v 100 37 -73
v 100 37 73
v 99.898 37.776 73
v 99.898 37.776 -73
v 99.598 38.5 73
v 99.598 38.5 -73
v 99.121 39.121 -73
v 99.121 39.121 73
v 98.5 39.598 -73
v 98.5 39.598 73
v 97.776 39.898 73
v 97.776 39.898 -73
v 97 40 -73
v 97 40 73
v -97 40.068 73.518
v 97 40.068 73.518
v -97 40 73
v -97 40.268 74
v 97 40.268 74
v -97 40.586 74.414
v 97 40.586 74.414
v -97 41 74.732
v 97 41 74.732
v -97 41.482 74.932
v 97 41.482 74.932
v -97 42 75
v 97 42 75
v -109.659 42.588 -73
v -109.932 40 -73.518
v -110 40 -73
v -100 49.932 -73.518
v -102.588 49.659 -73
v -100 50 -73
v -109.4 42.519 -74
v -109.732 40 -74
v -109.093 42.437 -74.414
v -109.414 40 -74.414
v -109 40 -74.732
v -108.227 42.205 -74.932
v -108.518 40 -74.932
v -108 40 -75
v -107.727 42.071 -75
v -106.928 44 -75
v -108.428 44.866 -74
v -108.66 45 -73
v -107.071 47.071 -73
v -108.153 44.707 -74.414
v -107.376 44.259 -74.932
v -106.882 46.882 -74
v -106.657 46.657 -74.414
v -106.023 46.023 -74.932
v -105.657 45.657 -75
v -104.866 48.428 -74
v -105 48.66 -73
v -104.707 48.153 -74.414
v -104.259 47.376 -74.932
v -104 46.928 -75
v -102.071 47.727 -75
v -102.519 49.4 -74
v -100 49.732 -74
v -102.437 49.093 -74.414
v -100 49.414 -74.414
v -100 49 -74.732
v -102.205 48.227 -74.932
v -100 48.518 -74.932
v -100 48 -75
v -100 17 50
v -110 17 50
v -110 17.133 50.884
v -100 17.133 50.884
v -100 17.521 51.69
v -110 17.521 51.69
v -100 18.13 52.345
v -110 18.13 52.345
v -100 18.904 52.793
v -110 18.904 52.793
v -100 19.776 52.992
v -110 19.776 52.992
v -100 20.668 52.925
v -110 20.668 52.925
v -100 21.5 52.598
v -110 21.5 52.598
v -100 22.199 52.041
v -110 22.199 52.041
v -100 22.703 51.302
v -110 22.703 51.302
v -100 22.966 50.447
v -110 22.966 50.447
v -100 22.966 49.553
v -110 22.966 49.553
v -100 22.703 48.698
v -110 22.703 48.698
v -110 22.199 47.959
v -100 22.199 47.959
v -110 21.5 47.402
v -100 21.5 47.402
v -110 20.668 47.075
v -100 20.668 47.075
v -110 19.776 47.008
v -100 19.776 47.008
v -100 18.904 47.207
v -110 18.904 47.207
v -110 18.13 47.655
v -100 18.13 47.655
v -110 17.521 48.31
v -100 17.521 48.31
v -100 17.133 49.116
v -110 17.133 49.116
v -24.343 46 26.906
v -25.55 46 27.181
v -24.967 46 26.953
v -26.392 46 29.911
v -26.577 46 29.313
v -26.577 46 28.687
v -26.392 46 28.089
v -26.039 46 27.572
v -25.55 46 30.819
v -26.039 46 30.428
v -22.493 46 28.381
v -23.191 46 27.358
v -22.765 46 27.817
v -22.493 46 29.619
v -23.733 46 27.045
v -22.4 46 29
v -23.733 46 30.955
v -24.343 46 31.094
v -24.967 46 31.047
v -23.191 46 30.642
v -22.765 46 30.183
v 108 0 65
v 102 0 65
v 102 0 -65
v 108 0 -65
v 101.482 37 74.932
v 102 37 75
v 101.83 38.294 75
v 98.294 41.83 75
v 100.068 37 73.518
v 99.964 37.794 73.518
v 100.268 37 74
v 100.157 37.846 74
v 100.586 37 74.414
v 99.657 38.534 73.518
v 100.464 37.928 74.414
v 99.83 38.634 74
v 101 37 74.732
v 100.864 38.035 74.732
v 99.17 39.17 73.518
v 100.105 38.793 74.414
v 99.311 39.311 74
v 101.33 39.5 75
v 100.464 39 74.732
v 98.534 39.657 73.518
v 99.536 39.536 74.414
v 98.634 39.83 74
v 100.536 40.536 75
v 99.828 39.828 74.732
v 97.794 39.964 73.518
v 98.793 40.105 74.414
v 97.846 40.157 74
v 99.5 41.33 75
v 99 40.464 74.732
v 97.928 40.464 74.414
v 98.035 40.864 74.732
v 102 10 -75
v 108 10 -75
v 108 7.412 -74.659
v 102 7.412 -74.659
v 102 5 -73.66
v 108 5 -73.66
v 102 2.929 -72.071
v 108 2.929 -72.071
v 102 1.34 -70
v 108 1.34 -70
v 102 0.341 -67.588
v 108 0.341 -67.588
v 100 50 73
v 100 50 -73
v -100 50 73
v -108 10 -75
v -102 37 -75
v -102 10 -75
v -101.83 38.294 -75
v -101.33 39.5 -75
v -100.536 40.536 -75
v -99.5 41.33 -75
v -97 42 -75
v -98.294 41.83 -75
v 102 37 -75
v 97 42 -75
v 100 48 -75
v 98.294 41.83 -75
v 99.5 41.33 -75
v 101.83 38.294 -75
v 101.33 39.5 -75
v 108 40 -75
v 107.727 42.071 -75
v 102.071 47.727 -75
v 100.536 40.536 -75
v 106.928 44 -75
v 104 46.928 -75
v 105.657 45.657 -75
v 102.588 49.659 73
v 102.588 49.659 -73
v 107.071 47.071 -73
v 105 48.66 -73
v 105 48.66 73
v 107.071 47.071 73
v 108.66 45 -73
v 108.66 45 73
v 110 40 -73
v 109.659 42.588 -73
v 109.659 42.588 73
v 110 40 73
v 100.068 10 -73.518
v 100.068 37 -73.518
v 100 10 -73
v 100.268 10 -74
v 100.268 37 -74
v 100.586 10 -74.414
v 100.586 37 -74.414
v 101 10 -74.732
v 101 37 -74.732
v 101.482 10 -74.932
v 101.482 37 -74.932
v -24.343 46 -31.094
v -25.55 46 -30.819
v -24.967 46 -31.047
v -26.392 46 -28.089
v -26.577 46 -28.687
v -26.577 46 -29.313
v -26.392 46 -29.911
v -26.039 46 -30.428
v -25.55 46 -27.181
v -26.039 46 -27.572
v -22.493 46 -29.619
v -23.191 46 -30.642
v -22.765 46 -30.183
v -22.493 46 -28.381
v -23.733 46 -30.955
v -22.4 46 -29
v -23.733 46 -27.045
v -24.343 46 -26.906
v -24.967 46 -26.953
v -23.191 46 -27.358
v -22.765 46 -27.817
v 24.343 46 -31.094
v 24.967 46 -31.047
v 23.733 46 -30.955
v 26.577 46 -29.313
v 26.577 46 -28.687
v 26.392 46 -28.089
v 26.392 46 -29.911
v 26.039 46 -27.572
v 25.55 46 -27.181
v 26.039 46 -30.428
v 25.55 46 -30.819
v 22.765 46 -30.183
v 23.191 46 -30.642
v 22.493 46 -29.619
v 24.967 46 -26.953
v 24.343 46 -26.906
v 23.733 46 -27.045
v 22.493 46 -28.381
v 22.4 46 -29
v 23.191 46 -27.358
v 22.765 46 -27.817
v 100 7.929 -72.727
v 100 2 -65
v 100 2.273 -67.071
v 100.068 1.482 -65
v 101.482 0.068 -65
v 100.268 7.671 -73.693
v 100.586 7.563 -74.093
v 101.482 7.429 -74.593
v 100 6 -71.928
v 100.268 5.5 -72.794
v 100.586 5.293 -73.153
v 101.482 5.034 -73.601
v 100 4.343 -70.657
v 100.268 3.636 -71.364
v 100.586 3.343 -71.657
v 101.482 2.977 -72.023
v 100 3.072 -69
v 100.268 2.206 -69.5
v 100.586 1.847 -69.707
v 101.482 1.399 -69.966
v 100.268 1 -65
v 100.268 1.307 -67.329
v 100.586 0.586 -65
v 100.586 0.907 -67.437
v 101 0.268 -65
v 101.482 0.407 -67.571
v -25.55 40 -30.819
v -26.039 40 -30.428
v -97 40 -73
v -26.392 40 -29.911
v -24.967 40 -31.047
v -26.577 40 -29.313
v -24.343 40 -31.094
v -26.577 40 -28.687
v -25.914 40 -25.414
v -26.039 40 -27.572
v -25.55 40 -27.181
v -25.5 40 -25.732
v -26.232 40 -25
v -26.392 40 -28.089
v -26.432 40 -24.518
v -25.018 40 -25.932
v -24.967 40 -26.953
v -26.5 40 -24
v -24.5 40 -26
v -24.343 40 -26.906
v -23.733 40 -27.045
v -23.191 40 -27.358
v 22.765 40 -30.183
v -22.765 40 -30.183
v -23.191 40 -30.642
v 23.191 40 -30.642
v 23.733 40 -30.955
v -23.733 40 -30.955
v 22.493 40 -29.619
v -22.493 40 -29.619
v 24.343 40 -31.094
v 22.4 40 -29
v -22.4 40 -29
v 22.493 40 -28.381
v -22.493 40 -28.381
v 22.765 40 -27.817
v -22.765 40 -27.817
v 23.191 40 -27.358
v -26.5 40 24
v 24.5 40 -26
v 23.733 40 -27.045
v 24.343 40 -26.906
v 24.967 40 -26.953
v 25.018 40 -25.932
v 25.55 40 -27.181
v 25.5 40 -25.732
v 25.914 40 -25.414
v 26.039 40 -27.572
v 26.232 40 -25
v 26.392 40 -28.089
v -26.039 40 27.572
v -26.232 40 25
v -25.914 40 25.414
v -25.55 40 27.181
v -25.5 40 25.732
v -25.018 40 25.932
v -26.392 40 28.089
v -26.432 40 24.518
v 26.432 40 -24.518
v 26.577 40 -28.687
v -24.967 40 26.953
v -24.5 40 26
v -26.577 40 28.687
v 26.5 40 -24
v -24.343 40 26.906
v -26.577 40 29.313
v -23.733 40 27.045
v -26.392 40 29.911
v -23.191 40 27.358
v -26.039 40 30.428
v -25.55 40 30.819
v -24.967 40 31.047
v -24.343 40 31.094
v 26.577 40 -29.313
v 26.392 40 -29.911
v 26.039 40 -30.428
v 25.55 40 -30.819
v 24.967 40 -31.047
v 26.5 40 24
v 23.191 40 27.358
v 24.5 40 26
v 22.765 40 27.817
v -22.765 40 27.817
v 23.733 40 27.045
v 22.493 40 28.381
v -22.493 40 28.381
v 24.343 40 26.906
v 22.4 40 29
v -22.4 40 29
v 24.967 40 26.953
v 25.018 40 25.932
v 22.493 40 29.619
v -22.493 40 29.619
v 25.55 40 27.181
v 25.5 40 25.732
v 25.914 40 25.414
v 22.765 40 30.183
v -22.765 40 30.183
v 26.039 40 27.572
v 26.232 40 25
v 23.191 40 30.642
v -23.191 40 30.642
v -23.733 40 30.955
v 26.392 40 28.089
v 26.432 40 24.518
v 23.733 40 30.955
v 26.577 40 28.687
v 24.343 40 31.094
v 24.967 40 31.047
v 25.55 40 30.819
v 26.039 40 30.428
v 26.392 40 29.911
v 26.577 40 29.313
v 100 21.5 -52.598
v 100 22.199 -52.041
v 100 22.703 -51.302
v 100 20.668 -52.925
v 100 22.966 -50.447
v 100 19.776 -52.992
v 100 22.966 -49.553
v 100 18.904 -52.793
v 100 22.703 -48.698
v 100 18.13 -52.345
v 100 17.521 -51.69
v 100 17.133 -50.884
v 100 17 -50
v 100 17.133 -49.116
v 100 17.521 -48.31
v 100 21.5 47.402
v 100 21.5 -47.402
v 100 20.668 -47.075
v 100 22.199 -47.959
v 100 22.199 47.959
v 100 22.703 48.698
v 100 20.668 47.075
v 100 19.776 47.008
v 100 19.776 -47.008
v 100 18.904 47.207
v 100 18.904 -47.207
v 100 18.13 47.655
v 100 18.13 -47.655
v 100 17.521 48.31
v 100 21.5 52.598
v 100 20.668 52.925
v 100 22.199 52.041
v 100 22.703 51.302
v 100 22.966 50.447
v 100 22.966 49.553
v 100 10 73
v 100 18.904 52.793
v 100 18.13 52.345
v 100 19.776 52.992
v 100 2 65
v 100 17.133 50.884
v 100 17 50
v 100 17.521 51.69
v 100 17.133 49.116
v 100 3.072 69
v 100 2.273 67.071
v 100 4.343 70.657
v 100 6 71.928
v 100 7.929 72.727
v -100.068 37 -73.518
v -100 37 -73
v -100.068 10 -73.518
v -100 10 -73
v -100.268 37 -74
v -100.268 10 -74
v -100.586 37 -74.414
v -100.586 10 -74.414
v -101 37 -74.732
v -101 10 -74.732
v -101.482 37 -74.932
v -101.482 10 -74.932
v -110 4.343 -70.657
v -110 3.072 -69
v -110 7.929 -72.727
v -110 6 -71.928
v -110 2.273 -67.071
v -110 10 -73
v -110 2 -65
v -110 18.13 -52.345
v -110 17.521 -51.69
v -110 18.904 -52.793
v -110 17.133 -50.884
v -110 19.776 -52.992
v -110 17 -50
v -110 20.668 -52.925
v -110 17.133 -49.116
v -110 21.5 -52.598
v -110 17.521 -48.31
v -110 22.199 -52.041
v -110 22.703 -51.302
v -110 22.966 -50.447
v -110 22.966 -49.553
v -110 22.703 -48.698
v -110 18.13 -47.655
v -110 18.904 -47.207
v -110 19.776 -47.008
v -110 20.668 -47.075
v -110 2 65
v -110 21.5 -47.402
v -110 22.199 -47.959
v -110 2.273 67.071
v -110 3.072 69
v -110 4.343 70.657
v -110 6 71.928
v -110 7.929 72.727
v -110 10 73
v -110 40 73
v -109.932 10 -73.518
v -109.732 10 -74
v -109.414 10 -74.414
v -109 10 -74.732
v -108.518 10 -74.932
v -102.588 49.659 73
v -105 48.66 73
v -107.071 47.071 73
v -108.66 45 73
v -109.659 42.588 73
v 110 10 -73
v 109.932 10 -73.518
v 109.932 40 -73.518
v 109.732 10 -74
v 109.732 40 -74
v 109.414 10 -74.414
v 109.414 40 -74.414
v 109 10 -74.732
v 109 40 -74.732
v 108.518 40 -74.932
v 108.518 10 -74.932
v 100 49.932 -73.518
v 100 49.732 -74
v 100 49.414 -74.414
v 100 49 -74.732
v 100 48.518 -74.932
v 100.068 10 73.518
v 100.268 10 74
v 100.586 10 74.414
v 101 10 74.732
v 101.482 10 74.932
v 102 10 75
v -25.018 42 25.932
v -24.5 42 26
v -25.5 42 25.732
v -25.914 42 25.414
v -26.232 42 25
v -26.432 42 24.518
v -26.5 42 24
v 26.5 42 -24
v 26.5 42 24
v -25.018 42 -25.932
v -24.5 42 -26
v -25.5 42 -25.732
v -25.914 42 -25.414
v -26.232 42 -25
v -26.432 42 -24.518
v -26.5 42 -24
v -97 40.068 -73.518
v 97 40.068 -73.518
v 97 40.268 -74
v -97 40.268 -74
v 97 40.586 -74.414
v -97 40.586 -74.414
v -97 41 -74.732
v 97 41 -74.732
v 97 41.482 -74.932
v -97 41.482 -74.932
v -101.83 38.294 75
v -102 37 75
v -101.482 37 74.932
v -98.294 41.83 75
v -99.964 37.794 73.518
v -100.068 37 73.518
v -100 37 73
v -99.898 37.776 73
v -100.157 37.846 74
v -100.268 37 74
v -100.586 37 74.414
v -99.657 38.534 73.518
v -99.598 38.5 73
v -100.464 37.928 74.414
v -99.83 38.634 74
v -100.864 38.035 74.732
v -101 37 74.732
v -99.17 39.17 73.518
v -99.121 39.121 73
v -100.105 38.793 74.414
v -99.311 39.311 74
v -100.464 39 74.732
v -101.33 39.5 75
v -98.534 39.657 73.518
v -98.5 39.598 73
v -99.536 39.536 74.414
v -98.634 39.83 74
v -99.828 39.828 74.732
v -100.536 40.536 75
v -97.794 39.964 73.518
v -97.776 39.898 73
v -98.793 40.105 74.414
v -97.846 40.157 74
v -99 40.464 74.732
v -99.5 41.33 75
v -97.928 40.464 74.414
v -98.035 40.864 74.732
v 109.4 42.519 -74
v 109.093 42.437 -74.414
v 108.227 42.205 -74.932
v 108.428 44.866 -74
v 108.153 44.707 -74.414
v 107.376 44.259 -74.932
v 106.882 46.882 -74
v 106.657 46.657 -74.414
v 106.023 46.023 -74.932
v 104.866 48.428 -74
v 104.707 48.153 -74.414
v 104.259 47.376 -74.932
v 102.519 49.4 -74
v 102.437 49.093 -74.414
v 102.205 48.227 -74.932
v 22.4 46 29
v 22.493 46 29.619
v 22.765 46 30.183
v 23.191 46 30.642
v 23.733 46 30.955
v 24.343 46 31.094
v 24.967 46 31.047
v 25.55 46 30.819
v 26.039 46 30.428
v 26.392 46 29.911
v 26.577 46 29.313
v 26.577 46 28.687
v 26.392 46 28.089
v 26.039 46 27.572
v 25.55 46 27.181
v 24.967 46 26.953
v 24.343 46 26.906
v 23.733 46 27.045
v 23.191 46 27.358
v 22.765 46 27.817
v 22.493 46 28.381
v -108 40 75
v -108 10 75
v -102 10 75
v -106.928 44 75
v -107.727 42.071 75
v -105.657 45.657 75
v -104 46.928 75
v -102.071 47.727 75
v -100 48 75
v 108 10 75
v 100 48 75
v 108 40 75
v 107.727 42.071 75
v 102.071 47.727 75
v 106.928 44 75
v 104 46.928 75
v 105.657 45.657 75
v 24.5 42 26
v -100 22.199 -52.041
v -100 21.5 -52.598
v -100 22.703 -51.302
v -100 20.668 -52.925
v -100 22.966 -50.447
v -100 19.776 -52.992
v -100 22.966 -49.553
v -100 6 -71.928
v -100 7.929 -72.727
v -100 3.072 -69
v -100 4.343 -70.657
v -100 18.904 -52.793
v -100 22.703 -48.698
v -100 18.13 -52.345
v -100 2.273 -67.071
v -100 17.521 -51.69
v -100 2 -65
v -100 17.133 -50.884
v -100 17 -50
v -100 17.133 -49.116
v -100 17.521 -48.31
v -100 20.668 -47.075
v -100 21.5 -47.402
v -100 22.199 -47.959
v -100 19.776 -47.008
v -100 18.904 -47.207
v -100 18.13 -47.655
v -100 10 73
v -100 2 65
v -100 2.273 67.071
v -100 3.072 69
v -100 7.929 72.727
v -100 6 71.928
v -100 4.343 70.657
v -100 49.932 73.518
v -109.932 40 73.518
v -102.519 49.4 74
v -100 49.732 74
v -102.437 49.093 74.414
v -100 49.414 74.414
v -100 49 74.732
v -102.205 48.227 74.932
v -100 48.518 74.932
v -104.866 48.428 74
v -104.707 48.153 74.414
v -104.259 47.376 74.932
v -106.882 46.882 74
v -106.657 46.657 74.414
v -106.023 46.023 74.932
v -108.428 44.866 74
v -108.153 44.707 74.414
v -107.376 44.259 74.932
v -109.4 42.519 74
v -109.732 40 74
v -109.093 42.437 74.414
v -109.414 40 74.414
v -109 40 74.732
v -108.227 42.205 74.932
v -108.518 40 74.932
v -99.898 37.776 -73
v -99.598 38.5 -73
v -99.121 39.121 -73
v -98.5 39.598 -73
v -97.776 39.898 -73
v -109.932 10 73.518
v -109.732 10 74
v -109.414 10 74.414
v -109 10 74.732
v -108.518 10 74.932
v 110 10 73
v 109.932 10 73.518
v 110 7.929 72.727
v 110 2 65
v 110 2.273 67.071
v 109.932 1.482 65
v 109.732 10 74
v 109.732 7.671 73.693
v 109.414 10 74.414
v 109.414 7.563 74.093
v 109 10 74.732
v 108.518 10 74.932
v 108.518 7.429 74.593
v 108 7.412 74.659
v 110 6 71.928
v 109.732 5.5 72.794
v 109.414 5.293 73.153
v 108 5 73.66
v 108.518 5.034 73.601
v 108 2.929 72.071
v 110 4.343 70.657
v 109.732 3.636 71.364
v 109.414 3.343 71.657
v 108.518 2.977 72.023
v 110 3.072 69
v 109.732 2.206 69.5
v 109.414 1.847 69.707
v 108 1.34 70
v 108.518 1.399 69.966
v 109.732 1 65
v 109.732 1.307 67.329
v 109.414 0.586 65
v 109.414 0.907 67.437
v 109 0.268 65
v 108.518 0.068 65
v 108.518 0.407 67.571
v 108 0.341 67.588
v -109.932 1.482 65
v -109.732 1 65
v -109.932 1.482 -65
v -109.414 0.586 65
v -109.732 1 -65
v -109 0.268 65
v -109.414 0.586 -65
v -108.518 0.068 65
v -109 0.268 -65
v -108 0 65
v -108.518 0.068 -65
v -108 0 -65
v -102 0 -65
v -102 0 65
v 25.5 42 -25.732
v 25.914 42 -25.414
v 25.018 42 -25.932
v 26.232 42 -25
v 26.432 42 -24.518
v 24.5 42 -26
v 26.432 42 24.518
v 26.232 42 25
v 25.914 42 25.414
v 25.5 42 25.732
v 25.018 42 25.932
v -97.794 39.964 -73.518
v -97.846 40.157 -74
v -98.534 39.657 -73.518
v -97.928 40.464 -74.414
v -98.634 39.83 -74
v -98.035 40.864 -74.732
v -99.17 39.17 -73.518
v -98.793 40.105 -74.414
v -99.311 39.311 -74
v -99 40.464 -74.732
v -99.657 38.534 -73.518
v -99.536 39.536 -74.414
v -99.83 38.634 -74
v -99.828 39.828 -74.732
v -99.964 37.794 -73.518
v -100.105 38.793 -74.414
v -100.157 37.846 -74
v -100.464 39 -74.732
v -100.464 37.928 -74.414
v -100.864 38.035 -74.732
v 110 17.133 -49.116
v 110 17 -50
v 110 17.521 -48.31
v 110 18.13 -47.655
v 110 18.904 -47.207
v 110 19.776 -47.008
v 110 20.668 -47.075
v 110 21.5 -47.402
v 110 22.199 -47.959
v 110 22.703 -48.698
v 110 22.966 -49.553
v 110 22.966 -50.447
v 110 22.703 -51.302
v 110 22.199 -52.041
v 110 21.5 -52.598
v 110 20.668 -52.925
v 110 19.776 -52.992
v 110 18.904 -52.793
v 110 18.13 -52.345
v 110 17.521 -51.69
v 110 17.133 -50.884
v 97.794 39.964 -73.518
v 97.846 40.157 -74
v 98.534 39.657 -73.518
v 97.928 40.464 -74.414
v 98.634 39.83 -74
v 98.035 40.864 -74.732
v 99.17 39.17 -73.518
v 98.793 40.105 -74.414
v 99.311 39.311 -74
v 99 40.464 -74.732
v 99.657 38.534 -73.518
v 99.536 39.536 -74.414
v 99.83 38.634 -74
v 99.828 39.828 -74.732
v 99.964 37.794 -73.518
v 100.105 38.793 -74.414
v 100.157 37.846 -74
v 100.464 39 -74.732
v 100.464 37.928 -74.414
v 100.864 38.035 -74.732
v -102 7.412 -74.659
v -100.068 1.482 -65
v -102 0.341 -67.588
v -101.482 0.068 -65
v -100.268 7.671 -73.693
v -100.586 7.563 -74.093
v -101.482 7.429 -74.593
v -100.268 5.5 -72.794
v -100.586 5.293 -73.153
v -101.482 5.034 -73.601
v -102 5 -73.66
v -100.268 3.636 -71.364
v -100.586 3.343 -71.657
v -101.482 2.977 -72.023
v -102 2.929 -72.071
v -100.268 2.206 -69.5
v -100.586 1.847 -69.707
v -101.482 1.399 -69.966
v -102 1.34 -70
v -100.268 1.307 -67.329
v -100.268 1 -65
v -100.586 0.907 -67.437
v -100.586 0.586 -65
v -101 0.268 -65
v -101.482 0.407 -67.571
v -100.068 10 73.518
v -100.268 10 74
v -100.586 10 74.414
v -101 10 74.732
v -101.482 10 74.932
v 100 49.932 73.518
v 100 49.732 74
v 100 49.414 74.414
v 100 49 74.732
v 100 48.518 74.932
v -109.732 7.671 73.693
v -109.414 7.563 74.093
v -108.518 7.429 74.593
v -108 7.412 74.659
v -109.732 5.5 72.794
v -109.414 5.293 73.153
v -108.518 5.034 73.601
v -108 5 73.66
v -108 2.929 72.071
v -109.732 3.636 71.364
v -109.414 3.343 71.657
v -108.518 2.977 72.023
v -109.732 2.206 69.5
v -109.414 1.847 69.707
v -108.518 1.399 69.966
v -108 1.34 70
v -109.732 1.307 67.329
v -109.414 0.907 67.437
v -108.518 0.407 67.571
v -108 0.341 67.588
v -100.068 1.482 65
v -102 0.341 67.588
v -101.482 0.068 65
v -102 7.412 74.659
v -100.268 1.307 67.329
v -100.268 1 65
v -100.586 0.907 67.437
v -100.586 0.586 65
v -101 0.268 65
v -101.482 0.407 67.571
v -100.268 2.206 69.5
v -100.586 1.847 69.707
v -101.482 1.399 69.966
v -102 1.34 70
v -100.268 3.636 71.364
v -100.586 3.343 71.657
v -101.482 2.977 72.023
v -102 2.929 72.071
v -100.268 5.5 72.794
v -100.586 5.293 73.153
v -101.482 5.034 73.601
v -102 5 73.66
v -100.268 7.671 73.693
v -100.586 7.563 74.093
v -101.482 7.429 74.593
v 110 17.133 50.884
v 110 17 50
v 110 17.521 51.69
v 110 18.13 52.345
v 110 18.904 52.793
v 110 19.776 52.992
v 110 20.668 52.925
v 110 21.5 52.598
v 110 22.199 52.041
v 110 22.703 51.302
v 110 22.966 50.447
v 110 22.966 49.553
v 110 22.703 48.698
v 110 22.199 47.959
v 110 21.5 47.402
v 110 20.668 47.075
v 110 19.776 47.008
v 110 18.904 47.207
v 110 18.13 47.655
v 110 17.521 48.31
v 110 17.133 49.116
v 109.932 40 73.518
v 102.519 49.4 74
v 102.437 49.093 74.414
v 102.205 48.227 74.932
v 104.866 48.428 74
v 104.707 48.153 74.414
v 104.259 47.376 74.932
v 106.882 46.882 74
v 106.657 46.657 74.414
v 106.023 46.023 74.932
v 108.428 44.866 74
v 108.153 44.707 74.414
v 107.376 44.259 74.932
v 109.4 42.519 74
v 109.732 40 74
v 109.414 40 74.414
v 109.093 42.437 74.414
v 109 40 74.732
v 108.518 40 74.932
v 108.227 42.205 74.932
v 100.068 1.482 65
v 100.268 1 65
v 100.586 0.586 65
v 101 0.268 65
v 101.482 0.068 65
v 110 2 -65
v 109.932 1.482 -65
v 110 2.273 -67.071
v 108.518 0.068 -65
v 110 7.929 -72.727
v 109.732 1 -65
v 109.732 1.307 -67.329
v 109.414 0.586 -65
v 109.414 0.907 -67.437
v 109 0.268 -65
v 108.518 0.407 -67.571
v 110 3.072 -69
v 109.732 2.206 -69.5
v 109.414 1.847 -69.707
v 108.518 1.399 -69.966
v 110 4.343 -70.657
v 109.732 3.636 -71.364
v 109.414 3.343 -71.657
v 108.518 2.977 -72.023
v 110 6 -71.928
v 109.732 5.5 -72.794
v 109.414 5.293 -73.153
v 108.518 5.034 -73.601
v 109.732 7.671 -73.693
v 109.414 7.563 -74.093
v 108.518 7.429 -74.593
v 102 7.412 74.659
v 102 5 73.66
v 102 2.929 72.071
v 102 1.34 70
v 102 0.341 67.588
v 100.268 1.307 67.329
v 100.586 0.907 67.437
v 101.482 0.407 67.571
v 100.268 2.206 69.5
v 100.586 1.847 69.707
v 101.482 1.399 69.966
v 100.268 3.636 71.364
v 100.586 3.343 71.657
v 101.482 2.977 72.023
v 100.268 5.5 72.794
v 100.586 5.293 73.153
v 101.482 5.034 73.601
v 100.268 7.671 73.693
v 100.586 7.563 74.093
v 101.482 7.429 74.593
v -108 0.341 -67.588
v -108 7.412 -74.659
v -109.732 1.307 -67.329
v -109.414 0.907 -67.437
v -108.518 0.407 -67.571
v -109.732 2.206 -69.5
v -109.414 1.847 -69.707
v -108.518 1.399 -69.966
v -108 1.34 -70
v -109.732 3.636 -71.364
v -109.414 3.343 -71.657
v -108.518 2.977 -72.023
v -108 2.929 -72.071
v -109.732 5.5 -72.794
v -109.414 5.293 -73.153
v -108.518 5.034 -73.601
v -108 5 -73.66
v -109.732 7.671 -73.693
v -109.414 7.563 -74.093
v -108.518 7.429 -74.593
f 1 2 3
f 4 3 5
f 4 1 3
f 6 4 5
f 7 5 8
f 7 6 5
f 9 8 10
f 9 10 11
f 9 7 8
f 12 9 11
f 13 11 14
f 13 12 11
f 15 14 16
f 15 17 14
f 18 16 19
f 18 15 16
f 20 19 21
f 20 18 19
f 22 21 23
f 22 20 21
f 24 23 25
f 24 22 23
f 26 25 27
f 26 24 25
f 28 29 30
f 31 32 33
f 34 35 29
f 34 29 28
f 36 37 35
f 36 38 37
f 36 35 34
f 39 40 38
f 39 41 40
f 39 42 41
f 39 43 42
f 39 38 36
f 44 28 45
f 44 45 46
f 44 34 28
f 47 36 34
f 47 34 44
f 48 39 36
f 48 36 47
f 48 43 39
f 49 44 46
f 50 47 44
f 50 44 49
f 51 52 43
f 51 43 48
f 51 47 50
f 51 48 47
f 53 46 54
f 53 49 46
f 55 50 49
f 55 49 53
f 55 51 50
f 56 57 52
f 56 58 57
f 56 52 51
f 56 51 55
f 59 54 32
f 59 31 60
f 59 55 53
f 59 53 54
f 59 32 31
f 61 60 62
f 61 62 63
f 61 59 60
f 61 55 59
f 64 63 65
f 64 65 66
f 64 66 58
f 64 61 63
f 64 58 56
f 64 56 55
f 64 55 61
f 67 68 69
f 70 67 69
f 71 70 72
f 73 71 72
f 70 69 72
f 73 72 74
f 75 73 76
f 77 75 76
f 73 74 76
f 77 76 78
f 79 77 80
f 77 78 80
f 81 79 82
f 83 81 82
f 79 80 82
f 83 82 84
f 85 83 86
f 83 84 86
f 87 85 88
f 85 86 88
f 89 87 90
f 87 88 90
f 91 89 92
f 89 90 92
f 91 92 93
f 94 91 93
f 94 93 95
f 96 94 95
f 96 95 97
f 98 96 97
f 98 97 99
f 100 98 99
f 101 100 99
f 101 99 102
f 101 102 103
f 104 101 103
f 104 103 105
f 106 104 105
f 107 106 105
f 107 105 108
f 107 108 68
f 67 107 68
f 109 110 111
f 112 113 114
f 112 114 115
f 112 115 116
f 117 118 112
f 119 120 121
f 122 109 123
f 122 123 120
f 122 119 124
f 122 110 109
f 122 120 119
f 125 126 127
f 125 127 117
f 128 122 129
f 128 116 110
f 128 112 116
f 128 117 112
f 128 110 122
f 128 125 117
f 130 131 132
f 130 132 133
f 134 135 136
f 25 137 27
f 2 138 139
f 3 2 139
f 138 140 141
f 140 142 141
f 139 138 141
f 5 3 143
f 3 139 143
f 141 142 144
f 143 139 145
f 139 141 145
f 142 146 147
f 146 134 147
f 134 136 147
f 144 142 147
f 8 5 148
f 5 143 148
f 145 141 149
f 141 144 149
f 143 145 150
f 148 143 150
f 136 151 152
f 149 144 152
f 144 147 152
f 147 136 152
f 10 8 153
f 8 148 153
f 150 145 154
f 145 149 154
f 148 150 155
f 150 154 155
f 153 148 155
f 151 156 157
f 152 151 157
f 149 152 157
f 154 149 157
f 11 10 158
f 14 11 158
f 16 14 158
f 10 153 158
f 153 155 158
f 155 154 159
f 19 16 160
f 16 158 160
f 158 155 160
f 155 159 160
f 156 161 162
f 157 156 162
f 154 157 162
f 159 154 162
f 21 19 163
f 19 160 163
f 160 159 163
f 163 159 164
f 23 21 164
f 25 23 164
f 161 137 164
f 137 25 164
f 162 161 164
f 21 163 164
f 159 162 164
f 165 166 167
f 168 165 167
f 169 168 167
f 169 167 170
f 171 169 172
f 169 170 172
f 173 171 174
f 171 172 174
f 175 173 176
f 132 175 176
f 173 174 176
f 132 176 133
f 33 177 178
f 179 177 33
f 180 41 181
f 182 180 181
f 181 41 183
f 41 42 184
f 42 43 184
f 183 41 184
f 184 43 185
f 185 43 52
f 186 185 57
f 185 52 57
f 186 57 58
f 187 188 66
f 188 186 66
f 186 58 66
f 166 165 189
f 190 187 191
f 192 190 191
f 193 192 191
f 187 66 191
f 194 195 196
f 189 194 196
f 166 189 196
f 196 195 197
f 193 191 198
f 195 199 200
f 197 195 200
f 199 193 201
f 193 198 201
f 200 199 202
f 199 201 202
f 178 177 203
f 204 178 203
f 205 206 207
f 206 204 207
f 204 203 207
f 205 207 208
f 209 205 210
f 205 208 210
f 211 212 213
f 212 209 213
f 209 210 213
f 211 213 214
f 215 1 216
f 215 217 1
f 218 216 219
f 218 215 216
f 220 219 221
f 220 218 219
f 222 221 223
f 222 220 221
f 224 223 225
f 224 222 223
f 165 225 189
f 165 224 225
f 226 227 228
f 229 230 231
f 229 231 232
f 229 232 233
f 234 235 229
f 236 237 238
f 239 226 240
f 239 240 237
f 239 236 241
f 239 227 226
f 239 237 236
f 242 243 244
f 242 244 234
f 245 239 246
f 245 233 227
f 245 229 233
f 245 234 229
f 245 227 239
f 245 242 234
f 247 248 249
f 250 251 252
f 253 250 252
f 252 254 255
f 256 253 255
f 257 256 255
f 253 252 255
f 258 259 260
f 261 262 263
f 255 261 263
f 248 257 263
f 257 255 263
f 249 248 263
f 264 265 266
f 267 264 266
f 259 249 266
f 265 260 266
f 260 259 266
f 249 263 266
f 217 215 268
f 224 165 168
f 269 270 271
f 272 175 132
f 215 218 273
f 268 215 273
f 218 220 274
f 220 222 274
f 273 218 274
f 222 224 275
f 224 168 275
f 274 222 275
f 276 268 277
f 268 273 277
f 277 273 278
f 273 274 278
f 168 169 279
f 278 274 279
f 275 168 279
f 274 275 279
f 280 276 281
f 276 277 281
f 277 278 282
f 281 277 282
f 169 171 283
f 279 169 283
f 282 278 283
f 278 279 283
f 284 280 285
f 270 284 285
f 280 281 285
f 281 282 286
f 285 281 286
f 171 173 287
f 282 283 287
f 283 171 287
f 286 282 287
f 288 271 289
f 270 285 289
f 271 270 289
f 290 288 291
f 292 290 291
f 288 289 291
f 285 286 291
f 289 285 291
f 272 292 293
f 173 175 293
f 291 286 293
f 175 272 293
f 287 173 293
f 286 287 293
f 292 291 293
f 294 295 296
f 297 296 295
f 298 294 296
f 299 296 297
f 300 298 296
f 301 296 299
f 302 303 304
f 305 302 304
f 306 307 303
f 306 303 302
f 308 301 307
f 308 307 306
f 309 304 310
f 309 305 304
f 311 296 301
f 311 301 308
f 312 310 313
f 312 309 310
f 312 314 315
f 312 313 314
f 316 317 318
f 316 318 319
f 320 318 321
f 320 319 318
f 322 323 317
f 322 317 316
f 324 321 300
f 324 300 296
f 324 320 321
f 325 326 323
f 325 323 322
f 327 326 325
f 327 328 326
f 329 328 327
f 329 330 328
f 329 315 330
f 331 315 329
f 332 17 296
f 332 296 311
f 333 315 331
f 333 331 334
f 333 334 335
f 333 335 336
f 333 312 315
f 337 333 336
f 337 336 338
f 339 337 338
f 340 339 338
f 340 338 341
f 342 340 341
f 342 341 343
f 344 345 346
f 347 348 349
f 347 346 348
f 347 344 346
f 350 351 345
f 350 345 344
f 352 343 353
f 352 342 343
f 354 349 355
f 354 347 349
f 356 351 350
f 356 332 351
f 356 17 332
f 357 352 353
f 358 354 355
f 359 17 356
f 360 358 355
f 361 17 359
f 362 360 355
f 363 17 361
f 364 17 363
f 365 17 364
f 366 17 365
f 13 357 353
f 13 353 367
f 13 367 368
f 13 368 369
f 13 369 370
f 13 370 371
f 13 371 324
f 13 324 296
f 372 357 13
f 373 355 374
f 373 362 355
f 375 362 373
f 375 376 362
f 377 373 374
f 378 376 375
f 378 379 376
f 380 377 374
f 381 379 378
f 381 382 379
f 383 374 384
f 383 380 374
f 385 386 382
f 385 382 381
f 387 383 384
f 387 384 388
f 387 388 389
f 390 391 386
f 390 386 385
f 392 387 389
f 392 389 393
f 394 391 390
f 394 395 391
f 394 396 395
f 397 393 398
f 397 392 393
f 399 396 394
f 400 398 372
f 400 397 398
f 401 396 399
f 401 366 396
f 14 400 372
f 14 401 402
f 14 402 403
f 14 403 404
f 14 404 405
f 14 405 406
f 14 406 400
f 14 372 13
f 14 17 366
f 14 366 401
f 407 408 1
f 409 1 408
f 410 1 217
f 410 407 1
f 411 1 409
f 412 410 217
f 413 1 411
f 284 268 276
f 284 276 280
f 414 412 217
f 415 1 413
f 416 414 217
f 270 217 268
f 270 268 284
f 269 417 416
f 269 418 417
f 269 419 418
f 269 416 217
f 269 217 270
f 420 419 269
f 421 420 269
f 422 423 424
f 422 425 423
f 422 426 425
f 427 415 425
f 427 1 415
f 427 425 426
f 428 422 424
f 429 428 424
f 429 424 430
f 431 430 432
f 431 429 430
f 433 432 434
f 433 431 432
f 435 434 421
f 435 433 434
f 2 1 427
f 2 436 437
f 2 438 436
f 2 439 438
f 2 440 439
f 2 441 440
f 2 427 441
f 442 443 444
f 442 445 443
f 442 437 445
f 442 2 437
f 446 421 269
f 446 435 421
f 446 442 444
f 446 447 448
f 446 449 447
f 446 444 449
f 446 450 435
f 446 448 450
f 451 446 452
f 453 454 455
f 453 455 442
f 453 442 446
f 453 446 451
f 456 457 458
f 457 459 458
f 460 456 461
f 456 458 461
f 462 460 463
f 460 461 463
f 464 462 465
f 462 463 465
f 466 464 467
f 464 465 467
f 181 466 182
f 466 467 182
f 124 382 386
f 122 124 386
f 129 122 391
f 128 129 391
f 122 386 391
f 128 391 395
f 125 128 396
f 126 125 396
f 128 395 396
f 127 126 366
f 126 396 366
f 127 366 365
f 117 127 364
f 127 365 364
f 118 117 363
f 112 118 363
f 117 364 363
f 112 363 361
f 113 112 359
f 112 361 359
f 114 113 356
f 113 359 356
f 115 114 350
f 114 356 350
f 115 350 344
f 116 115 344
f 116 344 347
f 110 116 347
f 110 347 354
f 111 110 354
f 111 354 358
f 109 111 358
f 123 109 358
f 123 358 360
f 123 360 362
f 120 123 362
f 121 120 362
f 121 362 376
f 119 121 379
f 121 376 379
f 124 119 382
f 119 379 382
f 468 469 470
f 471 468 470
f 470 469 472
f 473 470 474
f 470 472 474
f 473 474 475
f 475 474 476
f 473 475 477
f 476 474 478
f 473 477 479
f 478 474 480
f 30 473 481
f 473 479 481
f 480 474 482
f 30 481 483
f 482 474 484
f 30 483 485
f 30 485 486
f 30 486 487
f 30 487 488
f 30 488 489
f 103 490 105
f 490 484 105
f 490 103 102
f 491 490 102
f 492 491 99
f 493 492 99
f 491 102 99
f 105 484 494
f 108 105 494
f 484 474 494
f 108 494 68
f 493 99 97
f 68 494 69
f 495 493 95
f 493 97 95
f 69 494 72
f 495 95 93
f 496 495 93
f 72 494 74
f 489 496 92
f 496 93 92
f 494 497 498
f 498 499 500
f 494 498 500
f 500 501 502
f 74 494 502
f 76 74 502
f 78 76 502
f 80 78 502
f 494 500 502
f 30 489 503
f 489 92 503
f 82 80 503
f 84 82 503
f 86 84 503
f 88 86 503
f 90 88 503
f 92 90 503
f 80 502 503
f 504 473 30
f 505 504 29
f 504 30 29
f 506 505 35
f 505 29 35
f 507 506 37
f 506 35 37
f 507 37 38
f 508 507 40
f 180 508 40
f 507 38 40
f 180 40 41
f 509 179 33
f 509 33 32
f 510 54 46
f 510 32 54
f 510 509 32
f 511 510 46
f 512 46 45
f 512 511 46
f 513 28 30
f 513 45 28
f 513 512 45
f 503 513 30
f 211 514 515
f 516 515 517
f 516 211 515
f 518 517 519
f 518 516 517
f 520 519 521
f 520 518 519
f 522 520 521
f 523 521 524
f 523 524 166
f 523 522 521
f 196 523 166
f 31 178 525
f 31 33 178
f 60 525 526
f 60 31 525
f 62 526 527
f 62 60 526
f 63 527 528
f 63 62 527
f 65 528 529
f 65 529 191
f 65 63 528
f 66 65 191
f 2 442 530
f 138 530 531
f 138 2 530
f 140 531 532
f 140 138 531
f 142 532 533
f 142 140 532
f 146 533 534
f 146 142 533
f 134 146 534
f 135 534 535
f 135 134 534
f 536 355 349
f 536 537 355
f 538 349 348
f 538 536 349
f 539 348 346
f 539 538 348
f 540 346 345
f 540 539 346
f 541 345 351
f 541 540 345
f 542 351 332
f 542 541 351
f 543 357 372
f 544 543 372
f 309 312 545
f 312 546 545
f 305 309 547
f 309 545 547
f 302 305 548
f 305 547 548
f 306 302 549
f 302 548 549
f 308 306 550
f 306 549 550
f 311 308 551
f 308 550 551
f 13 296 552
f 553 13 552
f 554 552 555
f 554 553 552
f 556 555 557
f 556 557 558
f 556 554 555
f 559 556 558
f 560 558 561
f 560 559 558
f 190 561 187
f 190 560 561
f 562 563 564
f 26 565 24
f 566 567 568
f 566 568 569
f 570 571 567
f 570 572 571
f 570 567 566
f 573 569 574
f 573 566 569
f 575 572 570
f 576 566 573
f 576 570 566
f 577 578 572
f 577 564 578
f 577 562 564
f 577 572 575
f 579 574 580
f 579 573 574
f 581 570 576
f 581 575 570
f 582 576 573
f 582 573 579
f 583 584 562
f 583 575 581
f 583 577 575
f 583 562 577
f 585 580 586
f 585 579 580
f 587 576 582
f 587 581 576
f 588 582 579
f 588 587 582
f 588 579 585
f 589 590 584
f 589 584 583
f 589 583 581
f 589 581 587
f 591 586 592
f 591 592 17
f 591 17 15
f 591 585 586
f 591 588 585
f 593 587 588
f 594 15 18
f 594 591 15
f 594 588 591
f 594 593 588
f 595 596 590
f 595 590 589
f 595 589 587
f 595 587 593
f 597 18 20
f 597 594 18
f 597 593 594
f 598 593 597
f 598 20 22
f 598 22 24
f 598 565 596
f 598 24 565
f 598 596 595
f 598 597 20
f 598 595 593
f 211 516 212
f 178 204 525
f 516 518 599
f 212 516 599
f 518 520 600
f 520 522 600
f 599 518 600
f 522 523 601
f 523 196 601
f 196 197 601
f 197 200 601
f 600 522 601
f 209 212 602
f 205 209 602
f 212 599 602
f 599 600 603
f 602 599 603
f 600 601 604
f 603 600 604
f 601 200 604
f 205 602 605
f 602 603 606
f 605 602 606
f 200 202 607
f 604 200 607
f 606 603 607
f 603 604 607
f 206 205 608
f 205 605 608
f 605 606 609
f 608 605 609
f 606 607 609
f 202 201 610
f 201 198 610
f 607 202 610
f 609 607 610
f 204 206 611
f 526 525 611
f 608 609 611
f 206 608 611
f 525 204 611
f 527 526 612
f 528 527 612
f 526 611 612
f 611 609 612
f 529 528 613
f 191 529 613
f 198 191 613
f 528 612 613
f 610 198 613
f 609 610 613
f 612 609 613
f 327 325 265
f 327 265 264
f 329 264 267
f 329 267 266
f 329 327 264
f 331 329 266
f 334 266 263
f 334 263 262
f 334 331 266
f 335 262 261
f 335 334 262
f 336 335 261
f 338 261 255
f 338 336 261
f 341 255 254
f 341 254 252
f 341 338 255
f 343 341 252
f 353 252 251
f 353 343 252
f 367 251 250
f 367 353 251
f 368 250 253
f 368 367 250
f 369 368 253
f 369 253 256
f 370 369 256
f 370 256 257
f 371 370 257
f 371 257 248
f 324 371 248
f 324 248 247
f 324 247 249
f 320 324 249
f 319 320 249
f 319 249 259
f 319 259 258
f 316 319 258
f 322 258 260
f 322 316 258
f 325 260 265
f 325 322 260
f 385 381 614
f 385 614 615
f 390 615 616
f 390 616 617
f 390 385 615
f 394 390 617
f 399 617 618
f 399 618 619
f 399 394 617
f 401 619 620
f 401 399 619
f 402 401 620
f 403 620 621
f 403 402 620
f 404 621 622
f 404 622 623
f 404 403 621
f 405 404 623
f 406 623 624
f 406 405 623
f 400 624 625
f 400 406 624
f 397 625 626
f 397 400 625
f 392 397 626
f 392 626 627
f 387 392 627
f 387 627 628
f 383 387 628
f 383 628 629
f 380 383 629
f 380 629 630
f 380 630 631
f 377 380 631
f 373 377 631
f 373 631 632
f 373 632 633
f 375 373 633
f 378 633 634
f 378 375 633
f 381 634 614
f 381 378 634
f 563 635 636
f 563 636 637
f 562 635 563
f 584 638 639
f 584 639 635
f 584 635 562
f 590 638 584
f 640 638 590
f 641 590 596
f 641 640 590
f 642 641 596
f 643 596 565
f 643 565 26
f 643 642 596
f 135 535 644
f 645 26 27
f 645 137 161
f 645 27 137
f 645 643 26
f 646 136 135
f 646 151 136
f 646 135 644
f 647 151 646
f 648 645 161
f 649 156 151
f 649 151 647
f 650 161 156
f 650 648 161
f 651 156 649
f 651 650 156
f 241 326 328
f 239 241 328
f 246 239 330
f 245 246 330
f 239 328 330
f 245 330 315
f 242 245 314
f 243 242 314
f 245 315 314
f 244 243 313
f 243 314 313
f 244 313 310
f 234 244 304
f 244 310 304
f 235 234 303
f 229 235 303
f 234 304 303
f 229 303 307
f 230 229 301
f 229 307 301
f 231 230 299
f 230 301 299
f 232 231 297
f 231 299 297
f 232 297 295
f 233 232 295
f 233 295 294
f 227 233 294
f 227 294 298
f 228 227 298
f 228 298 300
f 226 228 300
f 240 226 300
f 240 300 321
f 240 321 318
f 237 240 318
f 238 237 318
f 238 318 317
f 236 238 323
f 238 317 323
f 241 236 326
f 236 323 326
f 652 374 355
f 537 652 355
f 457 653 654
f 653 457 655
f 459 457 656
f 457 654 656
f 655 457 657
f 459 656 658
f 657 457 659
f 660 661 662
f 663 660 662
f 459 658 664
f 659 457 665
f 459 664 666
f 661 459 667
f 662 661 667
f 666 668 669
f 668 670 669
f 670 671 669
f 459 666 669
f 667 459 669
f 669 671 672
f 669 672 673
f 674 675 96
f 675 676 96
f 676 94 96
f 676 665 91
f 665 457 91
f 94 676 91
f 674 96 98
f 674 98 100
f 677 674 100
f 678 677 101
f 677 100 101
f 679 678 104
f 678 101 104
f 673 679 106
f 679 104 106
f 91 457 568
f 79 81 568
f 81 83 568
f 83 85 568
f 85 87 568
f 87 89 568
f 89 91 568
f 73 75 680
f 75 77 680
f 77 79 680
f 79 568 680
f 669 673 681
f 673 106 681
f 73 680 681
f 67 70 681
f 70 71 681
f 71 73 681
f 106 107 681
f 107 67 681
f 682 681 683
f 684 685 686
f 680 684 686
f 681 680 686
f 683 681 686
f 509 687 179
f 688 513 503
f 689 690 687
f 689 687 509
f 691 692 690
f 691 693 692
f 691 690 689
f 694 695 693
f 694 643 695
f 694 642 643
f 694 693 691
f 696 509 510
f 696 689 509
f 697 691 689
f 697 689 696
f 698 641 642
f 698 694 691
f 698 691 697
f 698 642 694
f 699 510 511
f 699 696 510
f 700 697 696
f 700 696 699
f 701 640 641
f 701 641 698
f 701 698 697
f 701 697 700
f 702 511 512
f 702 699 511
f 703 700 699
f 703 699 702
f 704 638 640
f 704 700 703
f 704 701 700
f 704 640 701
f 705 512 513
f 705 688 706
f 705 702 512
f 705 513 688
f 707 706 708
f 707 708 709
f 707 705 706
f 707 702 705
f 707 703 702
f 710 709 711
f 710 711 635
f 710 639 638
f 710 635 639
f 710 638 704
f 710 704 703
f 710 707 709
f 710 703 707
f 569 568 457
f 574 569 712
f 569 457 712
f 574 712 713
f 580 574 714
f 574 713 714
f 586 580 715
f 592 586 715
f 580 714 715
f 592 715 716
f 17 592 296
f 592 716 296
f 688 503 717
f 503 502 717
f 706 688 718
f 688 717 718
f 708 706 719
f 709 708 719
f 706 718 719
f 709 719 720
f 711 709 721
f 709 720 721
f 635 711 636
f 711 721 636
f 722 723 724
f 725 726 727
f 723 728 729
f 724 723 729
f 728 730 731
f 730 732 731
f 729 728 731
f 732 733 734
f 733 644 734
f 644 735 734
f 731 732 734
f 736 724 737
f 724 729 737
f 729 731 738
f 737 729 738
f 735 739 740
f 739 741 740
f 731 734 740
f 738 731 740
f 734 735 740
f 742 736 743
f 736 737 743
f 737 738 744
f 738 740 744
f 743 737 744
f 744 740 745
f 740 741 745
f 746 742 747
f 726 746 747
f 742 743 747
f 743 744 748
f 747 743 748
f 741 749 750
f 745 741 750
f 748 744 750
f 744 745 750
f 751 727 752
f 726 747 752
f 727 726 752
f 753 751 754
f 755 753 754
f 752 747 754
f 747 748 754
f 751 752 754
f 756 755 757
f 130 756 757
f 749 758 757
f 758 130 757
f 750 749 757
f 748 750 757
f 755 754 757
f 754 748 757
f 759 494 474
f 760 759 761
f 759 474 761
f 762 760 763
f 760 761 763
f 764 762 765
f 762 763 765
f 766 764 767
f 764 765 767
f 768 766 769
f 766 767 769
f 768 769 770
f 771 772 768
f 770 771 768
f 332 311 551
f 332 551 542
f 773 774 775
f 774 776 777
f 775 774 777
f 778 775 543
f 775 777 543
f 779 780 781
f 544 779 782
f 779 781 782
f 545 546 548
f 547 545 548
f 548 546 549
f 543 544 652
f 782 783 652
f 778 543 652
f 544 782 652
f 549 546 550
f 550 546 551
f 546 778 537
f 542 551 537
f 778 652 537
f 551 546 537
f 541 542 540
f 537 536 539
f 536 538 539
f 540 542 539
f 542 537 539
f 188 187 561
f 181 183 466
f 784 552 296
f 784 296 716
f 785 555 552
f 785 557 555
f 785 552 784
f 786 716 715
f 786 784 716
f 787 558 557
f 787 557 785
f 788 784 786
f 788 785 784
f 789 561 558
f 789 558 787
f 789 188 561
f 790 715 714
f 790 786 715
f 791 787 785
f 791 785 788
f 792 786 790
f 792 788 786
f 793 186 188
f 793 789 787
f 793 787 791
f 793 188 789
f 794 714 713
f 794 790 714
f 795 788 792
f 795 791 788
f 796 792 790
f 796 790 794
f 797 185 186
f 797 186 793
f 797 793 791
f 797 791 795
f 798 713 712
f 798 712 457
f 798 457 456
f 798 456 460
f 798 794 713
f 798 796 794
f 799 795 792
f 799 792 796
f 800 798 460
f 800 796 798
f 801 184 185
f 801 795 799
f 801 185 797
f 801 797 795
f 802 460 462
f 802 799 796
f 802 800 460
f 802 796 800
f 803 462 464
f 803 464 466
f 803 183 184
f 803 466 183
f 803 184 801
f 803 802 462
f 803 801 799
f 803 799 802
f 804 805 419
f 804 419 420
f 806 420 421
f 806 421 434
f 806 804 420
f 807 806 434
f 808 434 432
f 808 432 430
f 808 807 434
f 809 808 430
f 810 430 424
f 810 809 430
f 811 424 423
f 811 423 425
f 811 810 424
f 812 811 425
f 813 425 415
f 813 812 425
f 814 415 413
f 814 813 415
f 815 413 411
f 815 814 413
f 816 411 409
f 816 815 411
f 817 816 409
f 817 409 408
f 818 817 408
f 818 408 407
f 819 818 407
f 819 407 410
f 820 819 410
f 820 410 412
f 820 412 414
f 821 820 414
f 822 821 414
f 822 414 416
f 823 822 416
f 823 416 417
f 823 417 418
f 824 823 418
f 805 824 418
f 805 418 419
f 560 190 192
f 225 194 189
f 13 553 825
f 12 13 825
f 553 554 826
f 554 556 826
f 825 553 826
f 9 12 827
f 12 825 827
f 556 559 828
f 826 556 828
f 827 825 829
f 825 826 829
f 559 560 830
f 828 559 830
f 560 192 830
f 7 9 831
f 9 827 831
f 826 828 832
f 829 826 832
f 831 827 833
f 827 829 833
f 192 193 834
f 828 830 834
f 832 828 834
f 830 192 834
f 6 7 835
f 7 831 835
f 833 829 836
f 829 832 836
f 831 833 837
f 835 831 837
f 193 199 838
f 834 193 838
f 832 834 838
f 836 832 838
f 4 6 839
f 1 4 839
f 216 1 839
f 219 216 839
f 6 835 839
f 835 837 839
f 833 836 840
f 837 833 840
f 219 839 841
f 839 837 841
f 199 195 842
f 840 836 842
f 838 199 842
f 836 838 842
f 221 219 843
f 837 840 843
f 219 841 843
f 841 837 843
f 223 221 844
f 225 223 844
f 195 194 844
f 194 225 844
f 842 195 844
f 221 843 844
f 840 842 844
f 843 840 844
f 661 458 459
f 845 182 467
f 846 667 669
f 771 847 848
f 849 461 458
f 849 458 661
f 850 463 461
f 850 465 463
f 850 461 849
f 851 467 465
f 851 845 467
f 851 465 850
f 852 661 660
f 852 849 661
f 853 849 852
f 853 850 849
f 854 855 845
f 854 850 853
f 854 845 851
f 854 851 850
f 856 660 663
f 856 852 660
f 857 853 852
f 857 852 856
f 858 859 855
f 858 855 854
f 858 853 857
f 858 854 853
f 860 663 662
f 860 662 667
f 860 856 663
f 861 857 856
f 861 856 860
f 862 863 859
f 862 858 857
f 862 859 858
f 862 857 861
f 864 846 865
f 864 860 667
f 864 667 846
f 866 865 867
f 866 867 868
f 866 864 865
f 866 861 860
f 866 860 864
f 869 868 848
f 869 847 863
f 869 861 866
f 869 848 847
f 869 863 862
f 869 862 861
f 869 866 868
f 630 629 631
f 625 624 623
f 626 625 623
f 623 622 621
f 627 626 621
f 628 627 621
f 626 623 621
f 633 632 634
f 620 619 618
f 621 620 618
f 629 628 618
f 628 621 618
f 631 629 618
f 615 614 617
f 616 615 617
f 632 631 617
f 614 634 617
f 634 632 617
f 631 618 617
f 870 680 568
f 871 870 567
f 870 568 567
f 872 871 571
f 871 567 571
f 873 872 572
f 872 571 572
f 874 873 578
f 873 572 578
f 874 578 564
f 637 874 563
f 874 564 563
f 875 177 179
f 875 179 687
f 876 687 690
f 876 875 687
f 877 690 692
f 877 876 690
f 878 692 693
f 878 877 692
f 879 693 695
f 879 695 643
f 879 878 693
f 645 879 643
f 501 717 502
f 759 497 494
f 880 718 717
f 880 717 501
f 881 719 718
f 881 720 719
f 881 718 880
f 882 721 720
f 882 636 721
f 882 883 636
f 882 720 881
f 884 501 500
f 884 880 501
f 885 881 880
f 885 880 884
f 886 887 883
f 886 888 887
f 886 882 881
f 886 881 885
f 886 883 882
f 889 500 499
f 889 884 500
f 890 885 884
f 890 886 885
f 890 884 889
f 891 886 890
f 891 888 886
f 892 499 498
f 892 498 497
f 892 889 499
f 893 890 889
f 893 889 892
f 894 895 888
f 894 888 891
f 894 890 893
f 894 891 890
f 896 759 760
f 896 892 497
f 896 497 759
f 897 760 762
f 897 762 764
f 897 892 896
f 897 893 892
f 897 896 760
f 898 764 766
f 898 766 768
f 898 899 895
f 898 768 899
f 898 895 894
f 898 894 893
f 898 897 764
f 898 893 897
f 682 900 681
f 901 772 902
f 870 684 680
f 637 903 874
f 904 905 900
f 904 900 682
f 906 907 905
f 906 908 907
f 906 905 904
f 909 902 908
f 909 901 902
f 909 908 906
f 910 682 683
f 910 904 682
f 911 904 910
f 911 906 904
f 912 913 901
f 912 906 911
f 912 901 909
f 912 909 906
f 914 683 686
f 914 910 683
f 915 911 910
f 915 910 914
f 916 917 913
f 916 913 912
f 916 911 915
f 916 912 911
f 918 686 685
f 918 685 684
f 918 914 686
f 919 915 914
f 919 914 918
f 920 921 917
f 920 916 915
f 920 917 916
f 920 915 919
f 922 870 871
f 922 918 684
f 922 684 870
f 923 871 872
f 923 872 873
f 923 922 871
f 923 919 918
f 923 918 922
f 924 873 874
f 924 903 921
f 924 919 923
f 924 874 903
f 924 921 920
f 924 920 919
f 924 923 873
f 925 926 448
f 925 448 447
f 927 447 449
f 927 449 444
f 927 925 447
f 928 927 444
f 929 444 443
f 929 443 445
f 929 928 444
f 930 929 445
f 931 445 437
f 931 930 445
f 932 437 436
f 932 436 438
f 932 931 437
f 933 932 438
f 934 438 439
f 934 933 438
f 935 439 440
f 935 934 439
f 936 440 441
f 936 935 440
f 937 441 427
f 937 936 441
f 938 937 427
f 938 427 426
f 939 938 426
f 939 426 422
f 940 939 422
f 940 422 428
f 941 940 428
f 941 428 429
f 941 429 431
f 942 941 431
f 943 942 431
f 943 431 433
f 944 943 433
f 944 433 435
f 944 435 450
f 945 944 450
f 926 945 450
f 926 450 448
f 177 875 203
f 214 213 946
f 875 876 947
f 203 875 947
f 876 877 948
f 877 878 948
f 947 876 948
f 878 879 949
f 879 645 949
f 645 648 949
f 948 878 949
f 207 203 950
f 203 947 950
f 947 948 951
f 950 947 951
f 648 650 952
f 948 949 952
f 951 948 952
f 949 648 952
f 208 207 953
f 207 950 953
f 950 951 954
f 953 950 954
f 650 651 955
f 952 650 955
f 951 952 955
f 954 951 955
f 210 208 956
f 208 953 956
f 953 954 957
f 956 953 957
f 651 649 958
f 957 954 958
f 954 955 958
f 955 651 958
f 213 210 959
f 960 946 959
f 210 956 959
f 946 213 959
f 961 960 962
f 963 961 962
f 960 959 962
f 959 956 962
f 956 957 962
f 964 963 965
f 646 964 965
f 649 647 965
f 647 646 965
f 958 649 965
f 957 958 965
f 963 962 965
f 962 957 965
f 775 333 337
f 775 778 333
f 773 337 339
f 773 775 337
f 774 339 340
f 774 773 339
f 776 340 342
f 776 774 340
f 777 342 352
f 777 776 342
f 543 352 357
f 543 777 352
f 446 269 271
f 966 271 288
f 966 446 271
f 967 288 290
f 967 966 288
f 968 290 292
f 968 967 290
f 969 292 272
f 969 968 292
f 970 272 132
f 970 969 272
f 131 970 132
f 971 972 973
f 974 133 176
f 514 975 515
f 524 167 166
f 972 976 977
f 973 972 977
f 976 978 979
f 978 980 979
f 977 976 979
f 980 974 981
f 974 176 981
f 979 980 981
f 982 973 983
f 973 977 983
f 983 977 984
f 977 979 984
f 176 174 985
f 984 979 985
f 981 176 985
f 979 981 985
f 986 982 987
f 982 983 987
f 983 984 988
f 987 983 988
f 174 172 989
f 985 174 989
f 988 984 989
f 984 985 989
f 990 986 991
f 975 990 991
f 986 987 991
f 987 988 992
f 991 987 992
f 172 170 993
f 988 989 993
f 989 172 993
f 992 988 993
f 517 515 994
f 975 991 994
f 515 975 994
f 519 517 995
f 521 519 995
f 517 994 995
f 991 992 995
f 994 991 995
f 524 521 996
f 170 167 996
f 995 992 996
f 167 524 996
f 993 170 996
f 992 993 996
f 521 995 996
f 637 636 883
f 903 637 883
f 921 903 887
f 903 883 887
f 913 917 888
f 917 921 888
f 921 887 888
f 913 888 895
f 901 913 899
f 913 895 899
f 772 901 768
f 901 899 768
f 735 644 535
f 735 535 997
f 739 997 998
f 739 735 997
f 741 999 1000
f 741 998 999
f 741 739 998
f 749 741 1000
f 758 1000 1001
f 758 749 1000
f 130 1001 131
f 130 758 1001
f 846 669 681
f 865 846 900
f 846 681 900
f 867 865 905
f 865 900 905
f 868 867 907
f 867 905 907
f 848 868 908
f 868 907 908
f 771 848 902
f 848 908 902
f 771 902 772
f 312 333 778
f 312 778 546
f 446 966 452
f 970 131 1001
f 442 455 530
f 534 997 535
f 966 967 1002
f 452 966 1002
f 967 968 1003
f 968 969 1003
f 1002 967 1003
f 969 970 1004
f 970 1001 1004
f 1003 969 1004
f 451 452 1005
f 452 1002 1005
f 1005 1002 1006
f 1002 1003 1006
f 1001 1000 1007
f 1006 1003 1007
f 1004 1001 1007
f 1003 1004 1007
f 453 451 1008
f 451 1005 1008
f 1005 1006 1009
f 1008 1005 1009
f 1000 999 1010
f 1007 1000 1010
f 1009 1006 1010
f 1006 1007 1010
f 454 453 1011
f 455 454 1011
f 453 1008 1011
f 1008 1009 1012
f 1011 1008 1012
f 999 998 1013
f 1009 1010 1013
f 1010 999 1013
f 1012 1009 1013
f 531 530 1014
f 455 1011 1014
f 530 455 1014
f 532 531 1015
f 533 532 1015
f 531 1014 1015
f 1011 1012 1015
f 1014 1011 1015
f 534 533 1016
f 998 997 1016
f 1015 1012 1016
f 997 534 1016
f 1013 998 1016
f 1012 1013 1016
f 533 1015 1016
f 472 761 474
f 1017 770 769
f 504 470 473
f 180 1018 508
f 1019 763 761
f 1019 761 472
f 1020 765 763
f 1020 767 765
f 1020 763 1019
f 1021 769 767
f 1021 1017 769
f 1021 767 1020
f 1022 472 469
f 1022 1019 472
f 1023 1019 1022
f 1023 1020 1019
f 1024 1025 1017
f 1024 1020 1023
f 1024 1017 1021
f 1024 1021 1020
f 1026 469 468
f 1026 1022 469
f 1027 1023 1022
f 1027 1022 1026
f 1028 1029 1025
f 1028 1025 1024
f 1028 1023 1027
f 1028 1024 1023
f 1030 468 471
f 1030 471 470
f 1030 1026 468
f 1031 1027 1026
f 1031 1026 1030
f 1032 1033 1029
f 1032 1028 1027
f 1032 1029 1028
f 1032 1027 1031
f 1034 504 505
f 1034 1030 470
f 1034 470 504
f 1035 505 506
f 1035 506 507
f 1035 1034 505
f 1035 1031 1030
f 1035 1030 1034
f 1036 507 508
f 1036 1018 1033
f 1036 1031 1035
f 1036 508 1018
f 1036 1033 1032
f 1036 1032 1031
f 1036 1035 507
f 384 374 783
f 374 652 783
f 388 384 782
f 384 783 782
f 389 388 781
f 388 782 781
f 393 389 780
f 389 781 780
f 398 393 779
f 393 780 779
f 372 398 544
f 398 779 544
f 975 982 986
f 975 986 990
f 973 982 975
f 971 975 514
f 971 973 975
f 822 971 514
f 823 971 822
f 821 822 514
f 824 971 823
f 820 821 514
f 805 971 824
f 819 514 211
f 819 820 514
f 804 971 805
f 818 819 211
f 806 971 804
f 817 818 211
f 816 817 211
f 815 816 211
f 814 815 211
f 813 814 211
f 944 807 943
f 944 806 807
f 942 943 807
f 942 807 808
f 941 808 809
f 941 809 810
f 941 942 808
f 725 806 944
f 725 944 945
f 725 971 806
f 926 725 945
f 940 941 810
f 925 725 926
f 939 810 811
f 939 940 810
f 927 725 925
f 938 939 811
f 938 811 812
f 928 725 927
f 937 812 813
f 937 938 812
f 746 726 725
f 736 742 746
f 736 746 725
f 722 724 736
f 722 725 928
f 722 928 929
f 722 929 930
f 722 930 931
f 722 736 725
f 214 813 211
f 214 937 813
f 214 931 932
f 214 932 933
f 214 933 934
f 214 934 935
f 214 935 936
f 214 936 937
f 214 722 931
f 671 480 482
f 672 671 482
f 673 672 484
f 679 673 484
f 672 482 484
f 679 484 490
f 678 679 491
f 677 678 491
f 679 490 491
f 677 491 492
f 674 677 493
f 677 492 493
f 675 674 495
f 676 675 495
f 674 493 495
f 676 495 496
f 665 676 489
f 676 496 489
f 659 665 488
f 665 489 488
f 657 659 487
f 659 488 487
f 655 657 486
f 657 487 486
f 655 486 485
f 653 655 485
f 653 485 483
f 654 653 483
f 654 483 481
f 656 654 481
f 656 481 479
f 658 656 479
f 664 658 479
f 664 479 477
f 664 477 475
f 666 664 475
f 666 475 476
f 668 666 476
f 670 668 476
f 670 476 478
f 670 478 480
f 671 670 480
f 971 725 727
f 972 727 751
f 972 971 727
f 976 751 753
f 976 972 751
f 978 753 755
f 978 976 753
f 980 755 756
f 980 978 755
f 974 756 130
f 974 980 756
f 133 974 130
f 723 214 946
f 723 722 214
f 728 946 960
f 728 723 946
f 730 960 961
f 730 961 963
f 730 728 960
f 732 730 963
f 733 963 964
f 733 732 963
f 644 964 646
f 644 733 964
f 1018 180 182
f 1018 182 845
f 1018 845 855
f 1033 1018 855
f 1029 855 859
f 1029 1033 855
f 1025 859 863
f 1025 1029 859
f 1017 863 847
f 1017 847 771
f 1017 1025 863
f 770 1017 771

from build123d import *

# Parameters (mm, degrees)
PAD_DEPTH       = 75
SKETCH001_R     = 3
POCKET_DEPTH    = 110.001
SKETCH002_R     = 2.1
POCKET001_DEPTH = 6
SKETCH003_W     = 26.5
SKETCH003_H     = 52
POCKET002_DEPTH = 2
FILLET_R        = 10
FILLET001_R     = 3
FILLET002_R     = 2
FILLET003_R     = 2


with BuildPart() as part:
    # Sketch → Pad (new body, symmetric)
    with BuildSketch(Plane.XY):
        Polygon((0, 40), (-100, 40), (-100, 0), (-110, 0), (-110, 50), (0, 50), align=None)
        Polygon((0, 40), (0, 50), align=None)
    extrude(amount=PAD_DEPTH, both=True)

    # Sketch001 (on Face3 of Pad) → Pocket (cut, through all)
    with BuildSketch(Plane(origin=(-110, 0, 0), x_dir=(0, -1, 0), z_dir=(-1, 0, 0))):
        with Locations((-20, -50)):
            Circle(SKETCH001_R)
        with Locations((-20, 50)):
            Circle(SKETCH001_R)
    extrude(amount=-POCKET_DEPTH, mode=Mode.SUBTRACT)

    # Sketch002 → Pocket001 (cut)
    with BuildSketch(Plane.XZ.offset(-40)):
        with Locations((-24.5, 29)):
            Circle(SKETCH002_R)
        with Locations((-24.5, -29)):
            Circle(SKETCH002_R)
    extrude(amount=-POCKET001_DEPTH, mode=Mode.SUBTRACT)

    # Sketch003 (on Face2 of Pocket001) → Pocket002 (cut)
    with BuildSketch(Plane.XZ.offset(-40)):
        with Locations((-13.25, 0)):
            Rectangle(SKETCH003_W, SKETCH003_H)
    extrude(amount=-POCKET002_DEPTH, mode=Mode.SUBTRACT)

    # Fillet
    fillet_edges = [part.edges().sort_by_distance(p)[0] for p in [
        (-105, 0, -75),
        (-105, 0, 75),
        (-110, 50, 0),
    ]]
    fillet(fillet_edges, radius=FILLET_R)

    # Fillet001
    fillet001_edges = [part.edges().sort_by_distance(p)[0] for p in [
        (-100, 40, 0),
    ]]
    fillet(fillet001_edges, radius=FILLET001_R)

    # Fillet002
    fillet002_edges = [part.edges().sort_by_distance(p)[0] for p in [
        (-110, 25, -75),
        (-100, 23.5, -75),
    ]]
    fillet(fillet002_edges, radius=FILLET002_R)

    # Fillet003
    fillet003_edges = [part.edges().sort_by_distance(p)[0] for p in [
        (-26.5, 41, 26),
        (-26.5, 41, -26),
    ]]
    fillet(fillet003_edges, radius=FILLET003_R)

    # Mirrored: part across YZ


with BuildPart() as part_1:
    add(part.part)
    add(part.part.mirror(Plane.YZ))


solid = part_1.part
